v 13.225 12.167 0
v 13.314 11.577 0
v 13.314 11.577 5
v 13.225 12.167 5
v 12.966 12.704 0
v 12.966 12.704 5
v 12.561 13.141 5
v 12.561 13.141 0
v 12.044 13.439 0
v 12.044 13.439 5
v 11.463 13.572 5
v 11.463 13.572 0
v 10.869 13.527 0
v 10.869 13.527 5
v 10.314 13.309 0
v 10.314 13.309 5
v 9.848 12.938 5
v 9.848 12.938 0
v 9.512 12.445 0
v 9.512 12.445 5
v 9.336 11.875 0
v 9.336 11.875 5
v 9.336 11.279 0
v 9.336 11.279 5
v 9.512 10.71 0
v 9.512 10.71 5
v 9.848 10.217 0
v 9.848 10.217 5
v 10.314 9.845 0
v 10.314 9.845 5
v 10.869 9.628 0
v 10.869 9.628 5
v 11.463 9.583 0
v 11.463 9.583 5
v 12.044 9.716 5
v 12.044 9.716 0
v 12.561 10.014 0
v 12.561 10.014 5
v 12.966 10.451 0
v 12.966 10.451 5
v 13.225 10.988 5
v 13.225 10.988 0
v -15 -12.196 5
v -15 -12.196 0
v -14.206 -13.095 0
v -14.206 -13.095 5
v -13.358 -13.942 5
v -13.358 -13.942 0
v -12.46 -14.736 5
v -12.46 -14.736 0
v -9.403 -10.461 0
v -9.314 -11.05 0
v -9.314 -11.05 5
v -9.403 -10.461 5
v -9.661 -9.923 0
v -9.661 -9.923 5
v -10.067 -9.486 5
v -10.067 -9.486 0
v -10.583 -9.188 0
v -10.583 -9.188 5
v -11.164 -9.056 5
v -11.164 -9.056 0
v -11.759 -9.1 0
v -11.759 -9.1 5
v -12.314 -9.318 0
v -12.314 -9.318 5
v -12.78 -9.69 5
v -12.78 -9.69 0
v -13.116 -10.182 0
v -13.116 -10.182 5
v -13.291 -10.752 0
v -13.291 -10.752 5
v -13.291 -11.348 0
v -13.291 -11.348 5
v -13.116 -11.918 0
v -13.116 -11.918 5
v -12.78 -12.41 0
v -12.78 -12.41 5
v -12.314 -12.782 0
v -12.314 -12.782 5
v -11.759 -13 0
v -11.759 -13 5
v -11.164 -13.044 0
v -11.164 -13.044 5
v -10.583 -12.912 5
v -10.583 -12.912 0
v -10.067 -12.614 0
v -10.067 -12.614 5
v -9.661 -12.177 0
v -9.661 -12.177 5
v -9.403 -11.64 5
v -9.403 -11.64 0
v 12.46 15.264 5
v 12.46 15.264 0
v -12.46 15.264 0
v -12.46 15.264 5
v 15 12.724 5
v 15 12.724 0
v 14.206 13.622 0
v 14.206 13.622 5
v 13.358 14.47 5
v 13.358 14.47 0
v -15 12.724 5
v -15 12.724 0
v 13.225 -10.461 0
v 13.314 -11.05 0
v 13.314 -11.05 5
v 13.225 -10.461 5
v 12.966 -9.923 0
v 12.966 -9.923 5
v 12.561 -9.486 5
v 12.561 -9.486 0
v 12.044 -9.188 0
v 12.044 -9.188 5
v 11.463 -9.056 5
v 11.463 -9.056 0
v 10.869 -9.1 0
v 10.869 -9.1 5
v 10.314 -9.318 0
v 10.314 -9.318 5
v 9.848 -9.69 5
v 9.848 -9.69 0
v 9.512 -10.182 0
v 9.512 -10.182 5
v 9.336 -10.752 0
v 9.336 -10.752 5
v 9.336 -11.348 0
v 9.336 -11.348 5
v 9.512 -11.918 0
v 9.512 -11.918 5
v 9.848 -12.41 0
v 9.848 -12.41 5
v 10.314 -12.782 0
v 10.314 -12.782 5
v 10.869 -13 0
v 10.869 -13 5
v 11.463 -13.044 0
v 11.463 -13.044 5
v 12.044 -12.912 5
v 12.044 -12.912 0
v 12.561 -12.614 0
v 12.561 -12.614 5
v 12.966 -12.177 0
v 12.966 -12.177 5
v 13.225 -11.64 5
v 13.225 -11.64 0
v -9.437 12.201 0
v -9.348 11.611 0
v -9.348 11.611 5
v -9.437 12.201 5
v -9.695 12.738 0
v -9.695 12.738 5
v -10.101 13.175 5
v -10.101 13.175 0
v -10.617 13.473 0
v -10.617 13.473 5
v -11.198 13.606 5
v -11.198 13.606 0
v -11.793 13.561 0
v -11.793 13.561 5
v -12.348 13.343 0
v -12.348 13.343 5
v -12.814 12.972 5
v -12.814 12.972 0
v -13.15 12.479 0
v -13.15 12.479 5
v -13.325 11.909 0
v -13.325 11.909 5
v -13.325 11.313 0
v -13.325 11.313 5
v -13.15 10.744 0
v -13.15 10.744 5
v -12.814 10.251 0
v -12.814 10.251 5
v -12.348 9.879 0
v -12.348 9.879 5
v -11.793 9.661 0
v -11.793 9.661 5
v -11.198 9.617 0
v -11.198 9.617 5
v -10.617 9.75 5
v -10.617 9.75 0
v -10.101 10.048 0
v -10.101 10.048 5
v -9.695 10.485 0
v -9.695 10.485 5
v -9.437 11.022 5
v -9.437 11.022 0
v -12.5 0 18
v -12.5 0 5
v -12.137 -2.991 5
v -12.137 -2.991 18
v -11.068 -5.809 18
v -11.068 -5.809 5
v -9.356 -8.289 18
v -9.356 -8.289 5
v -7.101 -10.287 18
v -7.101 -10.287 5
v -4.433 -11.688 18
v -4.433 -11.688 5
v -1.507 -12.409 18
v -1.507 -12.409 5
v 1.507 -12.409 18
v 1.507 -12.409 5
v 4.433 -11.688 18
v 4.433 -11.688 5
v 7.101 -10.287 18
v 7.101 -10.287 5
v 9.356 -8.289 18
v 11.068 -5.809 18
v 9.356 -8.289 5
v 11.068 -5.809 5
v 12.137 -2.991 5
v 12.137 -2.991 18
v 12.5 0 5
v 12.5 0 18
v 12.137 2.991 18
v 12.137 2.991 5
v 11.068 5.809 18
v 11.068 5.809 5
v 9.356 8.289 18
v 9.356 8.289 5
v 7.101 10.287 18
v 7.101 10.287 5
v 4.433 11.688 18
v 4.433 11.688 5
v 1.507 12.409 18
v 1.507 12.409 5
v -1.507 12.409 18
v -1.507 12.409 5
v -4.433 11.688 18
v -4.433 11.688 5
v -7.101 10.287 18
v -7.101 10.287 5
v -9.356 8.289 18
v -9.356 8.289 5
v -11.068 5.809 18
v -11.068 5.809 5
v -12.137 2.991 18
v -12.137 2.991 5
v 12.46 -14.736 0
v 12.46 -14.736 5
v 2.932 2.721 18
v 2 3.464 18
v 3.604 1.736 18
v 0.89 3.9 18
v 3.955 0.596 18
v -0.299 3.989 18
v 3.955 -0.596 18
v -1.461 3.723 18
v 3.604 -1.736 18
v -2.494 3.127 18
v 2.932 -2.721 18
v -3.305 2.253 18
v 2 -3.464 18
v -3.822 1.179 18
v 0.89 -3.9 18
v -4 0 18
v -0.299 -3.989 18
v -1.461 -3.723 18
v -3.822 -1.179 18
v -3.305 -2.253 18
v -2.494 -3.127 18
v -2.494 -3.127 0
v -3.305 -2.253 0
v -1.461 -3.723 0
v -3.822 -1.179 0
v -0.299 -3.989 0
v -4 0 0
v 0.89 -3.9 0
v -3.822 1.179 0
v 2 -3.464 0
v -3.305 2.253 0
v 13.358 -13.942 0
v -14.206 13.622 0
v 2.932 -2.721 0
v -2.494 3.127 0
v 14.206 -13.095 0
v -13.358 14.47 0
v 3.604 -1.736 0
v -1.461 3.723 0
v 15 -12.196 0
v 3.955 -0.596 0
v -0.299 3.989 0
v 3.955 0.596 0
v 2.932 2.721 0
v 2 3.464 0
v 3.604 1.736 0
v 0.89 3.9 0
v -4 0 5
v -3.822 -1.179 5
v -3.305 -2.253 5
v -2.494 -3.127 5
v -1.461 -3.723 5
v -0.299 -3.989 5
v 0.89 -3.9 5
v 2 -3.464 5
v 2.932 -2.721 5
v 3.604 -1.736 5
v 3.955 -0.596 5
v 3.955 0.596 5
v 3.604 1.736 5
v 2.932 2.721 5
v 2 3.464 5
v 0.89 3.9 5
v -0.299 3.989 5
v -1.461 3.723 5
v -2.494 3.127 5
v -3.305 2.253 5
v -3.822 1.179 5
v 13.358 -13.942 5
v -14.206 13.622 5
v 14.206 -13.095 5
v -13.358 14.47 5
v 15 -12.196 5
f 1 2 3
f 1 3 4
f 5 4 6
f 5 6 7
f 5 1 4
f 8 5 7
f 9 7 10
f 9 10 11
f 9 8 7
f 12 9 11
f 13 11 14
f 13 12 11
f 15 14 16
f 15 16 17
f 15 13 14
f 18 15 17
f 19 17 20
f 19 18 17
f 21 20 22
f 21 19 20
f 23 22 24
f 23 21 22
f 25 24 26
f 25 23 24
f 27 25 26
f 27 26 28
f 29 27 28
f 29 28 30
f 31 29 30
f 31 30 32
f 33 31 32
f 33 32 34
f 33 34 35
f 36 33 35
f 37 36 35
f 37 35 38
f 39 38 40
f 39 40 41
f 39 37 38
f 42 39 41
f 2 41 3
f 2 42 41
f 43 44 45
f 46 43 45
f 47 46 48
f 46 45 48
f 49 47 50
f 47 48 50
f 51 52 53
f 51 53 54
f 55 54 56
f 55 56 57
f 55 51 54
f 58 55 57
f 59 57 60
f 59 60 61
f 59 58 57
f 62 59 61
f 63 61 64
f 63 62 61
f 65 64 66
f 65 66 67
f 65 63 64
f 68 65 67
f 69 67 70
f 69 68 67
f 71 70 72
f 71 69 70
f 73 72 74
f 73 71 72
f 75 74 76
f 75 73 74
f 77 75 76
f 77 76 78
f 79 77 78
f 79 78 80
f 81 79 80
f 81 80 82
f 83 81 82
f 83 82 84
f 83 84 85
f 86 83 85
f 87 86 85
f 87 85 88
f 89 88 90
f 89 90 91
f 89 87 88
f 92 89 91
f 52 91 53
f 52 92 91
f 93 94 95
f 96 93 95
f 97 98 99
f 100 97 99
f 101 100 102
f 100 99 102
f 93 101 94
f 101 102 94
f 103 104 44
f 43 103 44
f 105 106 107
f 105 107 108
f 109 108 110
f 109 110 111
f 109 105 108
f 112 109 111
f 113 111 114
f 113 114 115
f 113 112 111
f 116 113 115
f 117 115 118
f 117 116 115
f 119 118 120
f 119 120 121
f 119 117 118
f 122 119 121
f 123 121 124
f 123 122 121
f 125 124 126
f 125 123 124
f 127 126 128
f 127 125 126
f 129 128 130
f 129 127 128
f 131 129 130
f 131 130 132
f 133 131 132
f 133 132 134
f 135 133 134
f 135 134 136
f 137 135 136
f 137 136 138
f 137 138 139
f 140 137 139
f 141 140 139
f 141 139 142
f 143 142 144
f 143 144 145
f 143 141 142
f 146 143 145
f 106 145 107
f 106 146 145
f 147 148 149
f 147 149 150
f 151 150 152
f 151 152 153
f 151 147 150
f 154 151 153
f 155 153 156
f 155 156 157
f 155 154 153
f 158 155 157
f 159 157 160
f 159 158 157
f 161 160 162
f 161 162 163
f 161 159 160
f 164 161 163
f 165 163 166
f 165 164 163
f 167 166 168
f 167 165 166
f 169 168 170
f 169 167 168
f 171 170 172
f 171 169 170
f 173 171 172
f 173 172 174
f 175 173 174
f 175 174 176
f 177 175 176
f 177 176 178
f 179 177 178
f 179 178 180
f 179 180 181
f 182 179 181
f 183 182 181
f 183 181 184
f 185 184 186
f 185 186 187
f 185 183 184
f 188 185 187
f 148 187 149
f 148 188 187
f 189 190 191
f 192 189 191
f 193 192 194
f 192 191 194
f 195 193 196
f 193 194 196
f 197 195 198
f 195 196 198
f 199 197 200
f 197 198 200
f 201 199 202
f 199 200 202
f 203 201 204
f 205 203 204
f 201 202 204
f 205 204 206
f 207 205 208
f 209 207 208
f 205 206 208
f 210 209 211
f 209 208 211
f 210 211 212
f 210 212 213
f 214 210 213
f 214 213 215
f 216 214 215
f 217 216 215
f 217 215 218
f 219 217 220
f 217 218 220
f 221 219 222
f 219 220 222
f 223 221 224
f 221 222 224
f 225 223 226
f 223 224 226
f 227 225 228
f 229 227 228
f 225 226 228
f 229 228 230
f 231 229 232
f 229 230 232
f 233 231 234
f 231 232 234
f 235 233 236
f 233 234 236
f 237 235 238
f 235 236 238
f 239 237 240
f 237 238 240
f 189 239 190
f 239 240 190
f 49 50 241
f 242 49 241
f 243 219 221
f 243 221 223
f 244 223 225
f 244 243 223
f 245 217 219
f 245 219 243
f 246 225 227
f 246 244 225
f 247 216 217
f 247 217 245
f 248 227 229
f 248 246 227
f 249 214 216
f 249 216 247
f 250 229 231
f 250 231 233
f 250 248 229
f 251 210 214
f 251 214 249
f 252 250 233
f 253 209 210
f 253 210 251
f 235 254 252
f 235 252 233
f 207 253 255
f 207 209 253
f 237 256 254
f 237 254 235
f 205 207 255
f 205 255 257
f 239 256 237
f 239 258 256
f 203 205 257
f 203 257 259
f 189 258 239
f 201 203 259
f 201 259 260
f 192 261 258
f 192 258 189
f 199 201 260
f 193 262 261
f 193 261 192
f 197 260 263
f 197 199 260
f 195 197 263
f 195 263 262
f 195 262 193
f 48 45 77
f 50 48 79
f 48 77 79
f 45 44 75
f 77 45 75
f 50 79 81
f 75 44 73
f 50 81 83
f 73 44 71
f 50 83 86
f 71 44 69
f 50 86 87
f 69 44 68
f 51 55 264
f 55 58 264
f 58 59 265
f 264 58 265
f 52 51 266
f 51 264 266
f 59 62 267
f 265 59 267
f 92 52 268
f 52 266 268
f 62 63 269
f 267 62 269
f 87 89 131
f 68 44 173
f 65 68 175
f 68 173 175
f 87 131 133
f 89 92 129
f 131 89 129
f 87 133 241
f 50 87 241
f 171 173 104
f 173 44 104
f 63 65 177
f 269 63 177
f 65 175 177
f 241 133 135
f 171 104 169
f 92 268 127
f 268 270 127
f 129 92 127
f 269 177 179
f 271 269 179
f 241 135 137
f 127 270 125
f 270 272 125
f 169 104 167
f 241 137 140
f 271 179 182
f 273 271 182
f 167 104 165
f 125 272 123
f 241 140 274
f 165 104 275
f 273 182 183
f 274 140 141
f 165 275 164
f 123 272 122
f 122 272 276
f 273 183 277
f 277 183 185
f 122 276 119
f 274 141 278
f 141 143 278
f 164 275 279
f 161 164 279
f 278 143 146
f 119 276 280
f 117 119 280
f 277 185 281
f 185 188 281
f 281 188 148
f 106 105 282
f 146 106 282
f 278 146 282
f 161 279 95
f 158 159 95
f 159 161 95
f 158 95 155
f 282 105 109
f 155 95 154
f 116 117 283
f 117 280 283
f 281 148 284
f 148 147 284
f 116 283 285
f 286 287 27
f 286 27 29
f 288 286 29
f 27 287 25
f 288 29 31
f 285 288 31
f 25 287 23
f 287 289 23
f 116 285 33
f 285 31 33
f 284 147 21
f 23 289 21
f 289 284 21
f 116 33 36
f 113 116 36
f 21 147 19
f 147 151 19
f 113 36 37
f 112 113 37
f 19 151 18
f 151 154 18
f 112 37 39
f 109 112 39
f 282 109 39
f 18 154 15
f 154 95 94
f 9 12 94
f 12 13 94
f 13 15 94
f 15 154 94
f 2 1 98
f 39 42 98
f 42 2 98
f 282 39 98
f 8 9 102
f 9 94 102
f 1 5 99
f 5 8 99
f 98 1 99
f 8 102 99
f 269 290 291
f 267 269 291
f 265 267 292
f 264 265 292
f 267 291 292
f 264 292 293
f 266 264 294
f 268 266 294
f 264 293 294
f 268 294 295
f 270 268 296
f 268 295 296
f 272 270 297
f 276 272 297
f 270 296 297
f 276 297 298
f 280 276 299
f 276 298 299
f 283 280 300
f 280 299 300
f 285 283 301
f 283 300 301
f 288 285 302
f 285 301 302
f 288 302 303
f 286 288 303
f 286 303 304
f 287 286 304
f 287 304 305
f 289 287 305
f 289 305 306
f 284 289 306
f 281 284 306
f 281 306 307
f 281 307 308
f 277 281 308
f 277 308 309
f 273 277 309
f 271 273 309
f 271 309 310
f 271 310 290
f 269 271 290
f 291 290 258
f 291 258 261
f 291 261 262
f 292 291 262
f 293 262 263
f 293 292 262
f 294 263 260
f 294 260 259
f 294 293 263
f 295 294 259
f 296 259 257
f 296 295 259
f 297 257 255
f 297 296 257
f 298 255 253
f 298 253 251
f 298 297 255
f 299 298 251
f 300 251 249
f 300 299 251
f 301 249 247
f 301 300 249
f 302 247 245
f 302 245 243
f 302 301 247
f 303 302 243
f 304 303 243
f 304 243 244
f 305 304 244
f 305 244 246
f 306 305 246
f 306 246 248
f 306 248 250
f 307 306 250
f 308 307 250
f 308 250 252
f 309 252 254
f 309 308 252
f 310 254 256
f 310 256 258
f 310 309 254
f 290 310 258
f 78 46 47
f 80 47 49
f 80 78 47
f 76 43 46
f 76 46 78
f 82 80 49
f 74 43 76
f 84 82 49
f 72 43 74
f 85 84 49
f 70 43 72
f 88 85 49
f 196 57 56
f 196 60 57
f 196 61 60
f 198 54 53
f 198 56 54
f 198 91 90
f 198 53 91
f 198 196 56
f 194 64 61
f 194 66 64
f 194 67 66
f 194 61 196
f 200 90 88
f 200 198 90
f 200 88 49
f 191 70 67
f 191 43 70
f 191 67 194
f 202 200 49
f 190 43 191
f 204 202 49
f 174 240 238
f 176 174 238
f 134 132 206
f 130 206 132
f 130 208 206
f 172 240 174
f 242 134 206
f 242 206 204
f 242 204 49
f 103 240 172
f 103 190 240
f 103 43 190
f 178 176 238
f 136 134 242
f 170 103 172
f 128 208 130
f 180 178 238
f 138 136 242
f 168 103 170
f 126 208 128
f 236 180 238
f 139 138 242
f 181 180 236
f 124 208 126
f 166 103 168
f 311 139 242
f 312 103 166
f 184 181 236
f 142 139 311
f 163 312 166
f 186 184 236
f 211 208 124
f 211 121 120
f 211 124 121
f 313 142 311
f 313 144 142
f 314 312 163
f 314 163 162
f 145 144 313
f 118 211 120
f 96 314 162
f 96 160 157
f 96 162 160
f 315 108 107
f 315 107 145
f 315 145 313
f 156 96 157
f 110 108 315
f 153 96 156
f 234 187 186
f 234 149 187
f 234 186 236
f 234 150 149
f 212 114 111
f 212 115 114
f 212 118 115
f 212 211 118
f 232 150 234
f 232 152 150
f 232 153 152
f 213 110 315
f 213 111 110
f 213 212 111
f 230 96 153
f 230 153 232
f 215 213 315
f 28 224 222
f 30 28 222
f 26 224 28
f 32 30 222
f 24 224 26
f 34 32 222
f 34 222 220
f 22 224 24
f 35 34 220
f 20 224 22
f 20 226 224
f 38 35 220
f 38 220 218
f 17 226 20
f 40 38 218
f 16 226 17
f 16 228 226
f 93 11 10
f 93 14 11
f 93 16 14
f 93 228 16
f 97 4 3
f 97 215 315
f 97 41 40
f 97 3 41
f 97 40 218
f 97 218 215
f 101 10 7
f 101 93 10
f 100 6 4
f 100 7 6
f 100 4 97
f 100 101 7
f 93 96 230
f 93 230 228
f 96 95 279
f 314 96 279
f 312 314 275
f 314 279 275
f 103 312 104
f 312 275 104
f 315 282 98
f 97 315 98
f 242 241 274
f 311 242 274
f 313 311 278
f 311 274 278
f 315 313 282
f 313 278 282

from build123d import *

# Parameters (mm, degrees)
SKETCH_1_R          = 2
EXTRUDE_1_DEPTH     = 5
SKETCH_3_R          = 12.5
SKETCH_3_R_2        = 4
EXTRUDE_2_DEPTH     = 13
SKETCH_5_R          = 4
CUT_EXTRUDE_1_DEPTH = 26.039562279


with BuildPart() as part:
    # 草图1 → 凸台-拉伸1 (new body)
    with BuildSketch(Plane.XY):
        with BuildLine():
            Line((-12.459935794, -14.736328125), (12.459935794, -14.736328125))
            ThreePointArc((12.459935794, -14.736328125), (13.788582233, -13.524910358), (15, -12.196263919))
            Line((15, -12.196263919), (15, 12.723607669))
            ThreePointArc((15, 12.723607669), (13.788582233, 14.052254108), (12.459935794, 15.263671875))
            Line((12.459935794, 15.263671875), (-12.459935794, 15.263671875))
            ThreePointArc((-12.459935794, 15.263671875), (-13.788582233, 14.052254108), (-15, 12.723607669))
            Line((-15, 12.723607669), (-15, -12.196263919))
            ThreePointArc((-15, -12.196263919), (-13.788582233, -13.524910358), (-12.459935794, -14.736328125))
        make_face()
        with Locations((-11.347647071, 11.611318946)):
            Circle(SKETCH_1_R, mode=Mode.SUBTRACT)
        with Locations((11.313708499, 11.577380374)):
            Circle(SKETCH_1_R, mode=Mode.SUBTRACT)
        with Locations((11.313708499, -11.050036624)):
            Circle(SKETCH_1_R, mode=Mode.SUBTRACT)
        with Locations((-11.313708499, -11.050036624)):
            Circle(SKETCH_1_R, mode=Mode.SUBTRACT)
    extrude(amount=EXTRUDE_1_DEPTH)

    # 草图3 → 凸台-拉伸2 (add)
    with BuildSketch(Plane.XY.offset(5)):
        with Locations(Location((0, 0, 0), (0, 0, 180))):
            Circle(SKETCH_3_R)
        with Locations(Location((0, 0, 0), (0, 0, 180))):
            Circle(SKETCH_3_R_2, mode=Mode.SUBTRACT)
    extrude(amount=EXTRUDE_2_DEPTH)

    # 草图5 → 切除-拉伸1 (cut, through all)
    with BuildSketch(Plane.XY.offset(5)):
        with Locations(Location((0, 0, 0), (0, 0, 180))):
            Circle(SKETCH_5_R)
    extrude(amount=-CUT_EXTRUDE_1_DEPTH, mode=Mode.SUBTRACT)


solid = part.part
